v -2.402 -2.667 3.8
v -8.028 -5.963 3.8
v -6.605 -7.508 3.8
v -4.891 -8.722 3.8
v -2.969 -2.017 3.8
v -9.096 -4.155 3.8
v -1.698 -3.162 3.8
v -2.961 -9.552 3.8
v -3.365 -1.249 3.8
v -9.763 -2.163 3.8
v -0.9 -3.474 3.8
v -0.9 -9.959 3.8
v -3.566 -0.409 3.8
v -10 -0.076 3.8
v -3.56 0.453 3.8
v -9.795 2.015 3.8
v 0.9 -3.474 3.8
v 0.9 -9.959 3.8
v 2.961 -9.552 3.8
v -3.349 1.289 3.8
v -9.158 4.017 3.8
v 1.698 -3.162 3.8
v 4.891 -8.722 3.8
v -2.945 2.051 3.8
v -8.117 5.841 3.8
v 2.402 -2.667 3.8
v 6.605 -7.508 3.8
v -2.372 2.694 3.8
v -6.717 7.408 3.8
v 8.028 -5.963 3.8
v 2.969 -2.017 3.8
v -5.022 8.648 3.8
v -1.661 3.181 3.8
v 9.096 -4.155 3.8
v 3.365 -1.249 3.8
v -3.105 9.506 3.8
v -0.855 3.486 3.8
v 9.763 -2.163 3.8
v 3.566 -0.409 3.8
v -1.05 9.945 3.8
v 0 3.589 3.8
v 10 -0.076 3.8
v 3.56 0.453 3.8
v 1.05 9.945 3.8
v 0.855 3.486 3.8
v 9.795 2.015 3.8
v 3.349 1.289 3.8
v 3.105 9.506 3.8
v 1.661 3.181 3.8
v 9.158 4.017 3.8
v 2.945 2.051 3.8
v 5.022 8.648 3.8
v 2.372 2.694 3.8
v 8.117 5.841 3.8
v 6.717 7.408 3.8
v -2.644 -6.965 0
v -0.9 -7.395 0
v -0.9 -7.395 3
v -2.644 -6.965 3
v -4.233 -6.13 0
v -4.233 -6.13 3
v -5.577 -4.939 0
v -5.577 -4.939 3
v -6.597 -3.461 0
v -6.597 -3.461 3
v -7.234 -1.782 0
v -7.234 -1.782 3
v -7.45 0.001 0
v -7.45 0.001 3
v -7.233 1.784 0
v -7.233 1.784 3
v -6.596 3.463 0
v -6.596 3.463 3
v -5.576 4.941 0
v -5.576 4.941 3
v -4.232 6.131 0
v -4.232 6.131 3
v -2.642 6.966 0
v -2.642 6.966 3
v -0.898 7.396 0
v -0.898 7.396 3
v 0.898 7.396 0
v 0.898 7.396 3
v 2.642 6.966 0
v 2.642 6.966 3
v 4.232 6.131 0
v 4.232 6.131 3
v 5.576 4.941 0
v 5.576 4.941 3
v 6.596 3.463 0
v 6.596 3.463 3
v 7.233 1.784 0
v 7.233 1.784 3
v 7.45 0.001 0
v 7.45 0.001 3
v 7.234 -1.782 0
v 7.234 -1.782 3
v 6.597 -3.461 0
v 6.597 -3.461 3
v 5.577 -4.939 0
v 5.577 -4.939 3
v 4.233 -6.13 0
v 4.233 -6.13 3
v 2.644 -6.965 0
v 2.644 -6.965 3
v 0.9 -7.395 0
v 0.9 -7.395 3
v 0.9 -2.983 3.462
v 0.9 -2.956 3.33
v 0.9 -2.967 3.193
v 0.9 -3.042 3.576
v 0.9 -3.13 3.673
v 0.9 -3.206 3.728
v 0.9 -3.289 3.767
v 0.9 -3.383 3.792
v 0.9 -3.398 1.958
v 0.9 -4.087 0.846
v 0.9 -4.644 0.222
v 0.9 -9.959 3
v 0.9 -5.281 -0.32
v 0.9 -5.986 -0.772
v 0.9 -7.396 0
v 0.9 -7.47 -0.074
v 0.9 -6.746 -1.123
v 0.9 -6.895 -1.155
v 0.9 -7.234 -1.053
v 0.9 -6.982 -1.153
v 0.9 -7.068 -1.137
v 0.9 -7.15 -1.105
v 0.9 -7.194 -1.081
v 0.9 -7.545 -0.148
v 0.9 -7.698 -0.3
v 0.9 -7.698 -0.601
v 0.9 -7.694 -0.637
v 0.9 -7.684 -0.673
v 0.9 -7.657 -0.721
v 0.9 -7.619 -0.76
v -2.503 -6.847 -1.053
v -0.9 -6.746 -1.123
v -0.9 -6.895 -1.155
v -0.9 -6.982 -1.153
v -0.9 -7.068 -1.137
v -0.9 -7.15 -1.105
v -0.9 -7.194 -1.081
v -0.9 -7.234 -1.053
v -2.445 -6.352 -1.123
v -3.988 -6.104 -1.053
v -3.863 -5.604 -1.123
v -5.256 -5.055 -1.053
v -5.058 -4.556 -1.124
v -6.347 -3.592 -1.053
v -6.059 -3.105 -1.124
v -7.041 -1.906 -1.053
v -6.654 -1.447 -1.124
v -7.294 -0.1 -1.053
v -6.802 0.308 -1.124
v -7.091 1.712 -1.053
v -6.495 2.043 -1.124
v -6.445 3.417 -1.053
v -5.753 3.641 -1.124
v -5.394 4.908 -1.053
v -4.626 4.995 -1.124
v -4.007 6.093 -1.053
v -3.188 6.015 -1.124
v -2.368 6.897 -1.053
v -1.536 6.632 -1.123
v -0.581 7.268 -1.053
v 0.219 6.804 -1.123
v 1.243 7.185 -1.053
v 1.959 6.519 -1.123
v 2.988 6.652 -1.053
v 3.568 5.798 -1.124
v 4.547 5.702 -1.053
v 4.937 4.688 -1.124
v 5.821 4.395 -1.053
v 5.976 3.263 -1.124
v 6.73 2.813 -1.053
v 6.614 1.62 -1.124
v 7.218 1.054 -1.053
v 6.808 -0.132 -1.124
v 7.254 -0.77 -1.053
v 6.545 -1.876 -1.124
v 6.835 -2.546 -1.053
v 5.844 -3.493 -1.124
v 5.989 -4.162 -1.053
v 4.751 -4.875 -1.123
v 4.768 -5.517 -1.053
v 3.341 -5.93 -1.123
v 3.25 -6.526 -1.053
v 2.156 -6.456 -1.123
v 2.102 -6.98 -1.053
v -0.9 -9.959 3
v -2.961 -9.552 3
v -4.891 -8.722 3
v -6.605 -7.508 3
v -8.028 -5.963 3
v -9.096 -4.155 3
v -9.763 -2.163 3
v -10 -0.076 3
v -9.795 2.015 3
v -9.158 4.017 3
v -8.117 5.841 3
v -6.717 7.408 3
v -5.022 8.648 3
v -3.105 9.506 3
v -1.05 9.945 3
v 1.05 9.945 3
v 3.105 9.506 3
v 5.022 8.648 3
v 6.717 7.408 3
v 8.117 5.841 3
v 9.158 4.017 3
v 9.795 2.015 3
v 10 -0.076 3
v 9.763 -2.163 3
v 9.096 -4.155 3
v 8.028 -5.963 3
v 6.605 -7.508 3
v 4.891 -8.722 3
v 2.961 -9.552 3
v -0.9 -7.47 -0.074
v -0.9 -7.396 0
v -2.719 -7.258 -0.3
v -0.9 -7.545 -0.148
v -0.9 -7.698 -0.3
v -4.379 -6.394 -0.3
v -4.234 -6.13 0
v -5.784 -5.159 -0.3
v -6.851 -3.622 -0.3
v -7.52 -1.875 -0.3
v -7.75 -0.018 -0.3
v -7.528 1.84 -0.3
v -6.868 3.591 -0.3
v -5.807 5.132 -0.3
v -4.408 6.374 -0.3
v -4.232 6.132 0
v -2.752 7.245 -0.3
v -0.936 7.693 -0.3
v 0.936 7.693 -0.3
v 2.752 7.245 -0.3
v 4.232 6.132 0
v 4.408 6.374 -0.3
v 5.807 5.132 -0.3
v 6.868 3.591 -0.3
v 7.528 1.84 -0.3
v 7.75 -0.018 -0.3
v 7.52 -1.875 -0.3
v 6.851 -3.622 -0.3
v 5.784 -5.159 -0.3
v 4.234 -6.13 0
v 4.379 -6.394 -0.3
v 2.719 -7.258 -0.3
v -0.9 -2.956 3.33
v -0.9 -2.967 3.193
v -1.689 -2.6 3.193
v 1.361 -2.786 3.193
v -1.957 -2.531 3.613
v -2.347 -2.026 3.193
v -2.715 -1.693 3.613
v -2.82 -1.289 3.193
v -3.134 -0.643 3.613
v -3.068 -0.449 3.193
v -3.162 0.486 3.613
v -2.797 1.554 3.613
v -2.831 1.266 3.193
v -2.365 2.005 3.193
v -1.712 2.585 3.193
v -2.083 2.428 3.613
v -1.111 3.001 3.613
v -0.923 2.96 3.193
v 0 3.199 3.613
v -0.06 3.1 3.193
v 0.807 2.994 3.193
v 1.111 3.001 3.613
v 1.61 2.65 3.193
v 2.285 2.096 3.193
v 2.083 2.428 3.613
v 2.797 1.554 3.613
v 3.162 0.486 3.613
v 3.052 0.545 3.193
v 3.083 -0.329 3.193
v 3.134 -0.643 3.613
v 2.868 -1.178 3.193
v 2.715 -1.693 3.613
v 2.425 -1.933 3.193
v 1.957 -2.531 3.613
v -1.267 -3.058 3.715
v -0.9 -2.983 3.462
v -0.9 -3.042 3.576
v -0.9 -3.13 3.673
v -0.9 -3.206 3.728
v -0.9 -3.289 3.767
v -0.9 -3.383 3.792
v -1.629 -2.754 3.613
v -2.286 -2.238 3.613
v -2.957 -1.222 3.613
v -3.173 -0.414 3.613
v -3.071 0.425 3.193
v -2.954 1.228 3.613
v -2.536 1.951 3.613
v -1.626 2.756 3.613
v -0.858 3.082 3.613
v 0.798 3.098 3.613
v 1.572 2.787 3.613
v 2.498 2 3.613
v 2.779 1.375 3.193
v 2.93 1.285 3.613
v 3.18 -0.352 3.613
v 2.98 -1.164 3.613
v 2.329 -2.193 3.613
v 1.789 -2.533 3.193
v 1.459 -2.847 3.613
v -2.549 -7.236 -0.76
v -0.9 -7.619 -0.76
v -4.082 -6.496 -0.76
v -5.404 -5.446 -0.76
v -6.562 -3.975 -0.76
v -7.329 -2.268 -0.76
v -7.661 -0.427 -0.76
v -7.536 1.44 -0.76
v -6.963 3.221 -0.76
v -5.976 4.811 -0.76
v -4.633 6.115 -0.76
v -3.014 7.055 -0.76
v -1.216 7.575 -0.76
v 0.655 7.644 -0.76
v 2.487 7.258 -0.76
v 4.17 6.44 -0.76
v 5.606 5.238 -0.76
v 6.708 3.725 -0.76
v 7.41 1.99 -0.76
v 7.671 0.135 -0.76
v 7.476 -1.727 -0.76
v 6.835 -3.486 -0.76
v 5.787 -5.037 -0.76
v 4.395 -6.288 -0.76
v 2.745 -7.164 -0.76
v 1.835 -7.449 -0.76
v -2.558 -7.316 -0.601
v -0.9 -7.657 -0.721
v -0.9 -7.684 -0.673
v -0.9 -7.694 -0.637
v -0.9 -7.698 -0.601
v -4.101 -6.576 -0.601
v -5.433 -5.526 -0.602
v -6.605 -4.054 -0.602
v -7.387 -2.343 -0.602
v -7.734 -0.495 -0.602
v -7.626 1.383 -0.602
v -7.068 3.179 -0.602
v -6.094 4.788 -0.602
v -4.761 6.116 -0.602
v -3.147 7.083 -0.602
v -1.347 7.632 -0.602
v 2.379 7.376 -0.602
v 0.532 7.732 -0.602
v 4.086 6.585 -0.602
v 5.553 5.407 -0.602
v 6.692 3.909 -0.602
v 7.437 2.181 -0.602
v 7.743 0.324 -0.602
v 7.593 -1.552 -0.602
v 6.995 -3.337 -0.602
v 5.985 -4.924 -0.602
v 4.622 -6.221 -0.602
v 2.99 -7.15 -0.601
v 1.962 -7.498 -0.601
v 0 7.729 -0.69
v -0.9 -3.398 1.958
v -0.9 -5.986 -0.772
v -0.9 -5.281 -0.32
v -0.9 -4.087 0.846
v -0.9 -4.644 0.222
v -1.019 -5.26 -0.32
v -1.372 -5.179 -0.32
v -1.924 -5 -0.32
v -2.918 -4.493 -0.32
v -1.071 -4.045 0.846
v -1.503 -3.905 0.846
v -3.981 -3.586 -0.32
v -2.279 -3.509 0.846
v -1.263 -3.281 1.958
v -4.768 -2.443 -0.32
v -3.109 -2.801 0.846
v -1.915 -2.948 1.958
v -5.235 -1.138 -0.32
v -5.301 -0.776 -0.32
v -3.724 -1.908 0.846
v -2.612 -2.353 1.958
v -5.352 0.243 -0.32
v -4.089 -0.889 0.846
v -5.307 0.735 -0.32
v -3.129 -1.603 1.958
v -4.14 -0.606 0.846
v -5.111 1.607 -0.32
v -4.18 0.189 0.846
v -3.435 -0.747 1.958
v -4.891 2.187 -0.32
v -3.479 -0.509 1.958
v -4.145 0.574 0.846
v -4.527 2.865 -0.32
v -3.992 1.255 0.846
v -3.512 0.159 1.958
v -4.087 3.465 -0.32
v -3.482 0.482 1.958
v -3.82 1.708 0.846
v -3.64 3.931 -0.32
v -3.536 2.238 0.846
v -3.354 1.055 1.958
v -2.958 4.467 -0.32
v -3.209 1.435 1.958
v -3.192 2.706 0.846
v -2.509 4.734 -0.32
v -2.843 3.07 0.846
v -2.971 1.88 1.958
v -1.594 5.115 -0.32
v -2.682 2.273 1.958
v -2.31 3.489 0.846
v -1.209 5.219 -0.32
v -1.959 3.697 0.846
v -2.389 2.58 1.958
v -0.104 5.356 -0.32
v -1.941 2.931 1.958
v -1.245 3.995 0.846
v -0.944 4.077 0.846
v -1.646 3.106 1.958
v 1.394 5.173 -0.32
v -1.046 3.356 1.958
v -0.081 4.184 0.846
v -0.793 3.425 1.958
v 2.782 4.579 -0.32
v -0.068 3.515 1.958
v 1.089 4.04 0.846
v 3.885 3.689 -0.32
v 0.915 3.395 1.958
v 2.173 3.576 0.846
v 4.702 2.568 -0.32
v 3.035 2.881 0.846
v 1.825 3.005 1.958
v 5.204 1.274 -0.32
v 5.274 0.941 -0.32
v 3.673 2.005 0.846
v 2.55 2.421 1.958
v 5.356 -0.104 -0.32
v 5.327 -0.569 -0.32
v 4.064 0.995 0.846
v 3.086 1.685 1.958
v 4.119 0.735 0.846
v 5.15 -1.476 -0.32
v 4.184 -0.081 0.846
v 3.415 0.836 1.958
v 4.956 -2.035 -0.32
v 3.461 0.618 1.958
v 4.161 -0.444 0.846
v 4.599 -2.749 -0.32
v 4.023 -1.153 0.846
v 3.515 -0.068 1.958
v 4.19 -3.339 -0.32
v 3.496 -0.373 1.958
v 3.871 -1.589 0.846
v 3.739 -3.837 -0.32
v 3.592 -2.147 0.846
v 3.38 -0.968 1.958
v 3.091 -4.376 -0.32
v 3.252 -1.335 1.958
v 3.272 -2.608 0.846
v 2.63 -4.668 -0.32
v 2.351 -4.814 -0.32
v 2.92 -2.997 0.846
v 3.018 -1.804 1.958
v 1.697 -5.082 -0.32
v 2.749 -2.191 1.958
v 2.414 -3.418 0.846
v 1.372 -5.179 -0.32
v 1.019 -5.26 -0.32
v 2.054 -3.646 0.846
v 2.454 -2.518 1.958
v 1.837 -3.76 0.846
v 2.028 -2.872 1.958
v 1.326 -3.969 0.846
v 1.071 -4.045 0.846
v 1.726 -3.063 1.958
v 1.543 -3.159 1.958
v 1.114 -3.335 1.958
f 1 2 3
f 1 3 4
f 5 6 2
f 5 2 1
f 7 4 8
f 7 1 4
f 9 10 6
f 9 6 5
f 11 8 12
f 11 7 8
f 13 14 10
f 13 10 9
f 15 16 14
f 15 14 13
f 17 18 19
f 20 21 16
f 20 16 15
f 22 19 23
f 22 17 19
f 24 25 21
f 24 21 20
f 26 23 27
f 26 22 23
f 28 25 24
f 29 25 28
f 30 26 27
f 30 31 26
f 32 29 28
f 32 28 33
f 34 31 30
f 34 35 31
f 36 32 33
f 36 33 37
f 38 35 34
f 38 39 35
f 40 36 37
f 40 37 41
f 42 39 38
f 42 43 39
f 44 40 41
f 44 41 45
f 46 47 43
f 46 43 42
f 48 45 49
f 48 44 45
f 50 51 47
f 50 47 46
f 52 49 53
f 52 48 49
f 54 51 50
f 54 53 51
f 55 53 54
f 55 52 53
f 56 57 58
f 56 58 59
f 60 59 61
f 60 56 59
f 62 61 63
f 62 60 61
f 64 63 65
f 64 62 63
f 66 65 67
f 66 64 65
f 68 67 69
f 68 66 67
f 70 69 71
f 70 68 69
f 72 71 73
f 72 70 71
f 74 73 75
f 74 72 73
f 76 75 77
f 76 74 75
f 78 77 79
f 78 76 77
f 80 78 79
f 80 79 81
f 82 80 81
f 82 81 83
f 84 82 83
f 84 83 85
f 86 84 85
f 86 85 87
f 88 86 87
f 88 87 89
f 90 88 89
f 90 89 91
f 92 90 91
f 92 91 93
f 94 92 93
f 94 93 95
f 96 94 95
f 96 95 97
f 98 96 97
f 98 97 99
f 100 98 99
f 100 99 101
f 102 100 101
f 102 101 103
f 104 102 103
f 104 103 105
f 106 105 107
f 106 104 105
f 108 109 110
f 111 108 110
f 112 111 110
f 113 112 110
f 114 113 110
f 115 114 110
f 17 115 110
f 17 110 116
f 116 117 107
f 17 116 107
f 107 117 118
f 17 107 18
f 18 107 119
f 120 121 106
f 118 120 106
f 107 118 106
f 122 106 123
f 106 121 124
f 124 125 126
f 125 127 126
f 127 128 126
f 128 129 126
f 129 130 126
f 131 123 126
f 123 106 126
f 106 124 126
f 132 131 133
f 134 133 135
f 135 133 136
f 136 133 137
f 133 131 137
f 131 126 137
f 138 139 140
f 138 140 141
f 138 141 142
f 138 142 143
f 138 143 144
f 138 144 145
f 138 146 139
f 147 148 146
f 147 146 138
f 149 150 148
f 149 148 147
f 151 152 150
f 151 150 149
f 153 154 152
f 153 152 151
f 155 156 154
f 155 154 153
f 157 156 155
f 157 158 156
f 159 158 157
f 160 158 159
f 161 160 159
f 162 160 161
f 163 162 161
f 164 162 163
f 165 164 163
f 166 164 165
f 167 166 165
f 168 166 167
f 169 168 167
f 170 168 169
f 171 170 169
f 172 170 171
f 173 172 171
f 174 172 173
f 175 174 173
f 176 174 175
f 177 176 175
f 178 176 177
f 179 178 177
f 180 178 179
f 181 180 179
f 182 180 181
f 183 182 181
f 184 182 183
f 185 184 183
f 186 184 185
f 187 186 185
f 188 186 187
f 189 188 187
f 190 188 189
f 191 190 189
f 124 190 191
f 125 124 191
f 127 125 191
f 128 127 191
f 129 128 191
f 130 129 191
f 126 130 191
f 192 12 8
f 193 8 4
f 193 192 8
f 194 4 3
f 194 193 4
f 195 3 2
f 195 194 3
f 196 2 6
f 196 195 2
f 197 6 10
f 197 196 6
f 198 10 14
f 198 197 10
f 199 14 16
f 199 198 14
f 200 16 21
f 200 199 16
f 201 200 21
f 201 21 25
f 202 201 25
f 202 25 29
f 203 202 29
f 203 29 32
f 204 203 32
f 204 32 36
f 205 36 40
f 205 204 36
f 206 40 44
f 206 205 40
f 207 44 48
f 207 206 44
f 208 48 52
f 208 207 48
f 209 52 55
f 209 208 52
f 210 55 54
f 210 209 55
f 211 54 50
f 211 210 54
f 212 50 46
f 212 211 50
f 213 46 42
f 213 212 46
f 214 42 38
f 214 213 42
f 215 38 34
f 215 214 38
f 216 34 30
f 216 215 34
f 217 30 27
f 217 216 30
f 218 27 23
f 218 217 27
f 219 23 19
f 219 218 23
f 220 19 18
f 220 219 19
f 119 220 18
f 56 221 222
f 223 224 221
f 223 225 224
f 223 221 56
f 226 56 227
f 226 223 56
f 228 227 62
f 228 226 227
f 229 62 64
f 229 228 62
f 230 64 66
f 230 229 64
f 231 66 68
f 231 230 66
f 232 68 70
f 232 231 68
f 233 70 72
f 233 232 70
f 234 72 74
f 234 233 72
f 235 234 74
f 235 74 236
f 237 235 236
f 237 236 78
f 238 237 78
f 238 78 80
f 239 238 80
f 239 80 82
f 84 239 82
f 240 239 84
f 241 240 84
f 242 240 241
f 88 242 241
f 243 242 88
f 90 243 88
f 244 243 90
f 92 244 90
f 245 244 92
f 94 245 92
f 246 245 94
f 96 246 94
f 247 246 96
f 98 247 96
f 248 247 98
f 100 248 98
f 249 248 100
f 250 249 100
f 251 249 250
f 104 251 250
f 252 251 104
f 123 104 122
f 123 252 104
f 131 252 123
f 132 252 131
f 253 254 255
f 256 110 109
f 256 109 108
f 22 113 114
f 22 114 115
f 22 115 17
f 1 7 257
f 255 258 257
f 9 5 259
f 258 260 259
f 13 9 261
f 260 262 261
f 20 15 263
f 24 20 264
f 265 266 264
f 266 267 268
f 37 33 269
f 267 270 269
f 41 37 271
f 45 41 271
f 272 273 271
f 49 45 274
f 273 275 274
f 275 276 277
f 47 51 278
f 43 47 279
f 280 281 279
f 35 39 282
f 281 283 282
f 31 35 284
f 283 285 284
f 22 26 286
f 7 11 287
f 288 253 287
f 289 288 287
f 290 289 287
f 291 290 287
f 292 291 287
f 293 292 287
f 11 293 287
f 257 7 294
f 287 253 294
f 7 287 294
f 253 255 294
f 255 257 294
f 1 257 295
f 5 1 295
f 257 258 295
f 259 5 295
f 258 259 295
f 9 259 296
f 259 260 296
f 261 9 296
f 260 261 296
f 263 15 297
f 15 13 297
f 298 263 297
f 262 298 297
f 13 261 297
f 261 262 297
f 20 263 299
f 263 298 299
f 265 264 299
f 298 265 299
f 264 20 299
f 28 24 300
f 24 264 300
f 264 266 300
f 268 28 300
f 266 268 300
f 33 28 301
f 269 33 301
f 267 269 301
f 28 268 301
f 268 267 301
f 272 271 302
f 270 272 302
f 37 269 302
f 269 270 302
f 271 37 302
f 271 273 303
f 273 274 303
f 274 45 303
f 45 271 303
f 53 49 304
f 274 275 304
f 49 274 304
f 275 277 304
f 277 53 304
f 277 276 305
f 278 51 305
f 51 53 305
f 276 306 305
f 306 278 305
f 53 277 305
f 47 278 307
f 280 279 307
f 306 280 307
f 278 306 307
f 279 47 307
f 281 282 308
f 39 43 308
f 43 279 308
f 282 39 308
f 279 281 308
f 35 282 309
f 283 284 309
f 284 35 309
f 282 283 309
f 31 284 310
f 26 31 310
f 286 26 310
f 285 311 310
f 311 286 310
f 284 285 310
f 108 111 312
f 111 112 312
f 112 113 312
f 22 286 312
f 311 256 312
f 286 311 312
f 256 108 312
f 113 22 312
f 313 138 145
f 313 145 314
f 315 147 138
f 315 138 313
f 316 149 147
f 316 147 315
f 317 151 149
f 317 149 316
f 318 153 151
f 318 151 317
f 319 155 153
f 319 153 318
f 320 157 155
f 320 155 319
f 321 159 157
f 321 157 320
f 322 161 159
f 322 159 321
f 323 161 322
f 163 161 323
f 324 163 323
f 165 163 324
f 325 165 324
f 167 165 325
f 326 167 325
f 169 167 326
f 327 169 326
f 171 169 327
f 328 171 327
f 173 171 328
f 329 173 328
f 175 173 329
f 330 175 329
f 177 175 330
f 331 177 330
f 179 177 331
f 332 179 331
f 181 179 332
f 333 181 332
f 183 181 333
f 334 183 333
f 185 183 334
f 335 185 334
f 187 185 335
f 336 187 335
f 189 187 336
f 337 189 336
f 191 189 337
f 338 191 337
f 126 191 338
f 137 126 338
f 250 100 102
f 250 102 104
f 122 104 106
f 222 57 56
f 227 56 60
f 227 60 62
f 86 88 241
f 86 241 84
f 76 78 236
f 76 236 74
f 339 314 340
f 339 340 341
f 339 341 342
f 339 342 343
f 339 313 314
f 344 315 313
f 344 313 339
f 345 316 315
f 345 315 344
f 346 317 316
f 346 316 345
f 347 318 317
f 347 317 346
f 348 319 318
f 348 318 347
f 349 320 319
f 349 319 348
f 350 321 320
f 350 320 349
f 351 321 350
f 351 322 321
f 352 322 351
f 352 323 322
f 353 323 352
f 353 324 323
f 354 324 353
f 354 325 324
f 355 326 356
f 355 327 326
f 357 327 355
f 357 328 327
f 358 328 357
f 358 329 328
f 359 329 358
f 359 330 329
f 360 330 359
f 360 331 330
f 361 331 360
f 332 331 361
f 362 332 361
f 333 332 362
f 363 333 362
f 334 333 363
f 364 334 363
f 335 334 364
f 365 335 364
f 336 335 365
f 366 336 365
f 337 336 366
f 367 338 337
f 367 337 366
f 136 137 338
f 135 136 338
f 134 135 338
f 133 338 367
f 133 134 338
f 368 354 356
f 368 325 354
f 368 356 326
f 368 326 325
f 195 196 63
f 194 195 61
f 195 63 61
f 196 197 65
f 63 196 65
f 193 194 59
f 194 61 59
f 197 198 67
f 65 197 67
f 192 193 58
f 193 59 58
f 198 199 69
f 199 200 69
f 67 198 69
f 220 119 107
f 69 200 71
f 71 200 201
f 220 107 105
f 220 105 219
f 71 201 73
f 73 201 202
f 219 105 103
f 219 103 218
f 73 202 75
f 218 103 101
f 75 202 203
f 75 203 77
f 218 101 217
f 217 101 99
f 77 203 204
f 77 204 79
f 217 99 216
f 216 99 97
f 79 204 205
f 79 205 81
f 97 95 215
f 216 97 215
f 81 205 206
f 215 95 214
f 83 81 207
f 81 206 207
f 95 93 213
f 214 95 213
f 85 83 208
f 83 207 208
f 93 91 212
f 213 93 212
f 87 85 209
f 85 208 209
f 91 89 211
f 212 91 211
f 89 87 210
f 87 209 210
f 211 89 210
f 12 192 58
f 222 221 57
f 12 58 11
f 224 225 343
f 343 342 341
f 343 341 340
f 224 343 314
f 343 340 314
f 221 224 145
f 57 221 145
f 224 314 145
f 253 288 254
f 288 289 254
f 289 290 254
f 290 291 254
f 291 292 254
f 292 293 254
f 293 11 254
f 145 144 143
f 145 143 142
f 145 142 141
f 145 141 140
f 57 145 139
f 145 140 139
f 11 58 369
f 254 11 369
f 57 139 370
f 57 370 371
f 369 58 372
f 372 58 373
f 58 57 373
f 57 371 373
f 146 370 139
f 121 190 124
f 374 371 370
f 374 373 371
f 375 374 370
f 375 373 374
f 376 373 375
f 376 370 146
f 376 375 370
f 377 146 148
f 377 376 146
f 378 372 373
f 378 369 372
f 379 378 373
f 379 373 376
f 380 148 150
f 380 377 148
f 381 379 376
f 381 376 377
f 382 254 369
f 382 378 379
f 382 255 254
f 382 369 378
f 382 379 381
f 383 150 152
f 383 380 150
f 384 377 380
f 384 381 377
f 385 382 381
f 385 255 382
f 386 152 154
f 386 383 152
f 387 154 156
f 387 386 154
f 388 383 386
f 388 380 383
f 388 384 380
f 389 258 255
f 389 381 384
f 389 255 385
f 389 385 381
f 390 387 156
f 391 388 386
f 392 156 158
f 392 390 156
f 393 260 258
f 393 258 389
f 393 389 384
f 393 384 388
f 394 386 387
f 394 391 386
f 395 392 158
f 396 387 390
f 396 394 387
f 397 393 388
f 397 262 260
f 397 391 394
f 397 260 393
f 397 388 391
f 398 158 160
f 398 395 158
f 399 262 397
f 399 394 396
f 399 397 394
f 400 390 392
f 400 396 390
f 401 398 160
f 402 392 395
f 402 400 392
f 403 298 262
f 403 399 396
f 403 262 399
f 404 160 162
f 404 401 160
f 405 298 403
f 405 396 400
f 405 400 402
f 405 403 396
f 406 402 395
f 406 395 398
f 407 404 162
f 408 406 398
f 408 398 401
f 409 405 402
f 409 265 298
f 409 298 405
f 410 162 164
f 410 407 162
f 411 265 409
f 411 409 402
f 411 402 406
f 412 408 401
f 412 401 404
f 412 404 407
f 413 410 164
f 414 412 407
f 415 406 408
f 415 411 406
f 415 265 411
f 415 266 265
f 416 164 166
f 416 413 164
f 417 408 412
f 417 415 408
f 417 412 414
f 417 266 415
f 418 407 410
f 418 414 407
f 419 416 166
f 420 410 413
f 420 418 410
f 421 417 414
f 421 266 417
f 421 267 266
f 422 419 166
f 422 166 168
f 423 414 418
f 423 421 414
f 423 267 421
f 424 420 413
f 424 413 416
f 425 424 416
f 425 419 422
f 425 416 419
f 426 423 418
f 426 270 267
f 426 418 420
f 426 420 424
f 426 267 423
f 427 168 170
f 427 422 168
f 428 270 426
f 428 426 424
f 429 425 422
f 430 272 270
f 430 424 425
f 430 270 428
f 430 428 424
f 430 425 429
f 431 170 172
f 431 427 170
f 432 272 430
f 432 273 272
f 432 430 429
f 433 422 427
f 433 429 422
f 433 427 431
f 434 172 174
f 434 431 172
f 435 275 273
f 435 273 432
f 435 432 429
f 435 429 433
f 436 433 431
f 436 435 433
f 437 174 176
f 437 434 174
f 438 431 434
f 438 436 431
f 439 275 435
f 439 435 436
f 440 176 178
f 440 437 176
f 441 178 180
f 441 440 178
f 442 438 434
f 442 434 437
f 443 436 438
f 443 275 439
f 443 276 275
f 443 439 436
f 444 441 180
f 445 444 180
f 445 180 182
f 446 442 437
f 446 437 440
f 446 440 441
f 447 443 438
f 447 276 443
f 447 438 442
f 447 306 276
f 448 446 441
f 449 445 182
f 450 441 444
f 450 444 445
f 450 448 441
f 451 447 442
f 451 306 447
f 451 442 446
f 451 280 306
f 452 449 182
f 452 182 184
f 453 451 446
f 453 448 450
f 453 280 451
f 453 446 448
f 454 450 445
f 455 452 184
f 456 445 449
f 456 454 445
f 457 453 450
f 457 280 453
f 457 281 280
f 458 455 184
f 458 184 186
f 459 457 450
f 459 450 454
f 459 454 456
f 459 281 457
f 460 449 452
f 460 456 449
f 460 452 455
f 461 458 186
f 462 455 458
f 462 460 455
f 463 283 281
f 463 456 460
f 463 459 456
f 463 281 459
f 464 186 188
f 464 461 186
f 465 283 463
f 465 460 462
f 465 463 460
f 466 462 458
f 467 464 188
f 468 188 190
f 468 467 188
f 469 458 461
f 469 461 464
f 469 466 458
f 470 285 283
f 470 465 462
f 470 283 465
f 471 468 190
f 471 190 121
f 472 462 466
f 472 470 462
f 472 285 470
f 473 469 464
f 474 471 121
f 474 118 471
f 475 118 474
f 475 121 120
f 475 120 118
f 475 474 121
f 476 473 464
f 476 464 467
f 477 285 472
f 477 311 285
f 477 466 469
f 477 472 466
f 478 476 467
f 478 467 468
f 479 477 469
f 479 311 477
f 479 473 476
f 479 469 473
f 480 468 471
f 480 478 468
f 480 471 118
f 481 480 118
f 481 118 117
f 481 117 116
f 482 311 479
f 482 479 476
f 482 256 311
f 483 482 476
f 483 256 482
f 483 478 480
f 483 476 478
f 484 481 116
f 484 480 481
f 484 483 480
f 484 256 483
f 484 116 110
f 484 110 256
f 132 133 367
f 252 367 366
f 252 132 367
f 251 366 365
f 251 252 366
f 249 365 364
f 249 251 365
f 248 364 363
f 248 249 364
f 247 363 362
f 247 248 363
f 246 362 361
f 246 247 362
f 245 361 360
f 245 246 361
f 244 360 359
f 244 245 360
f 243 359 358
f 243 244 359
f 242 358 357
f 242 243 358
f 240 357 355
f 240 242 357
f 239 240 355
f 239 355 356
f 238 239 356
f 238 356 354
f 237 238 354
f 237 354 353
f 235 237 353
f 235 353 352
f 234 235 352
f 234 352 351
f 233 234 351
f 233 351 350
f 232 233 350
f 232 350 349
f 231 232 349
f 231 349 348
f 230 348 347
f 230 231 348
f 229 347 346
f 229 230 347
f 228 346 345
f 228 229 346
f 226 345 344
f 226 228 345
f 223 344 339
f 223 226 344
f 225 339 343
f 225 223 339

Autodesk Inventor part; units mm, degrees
ref_plane "YZ Plane" through (0, 0, 0) normal (1, 0, 0) x (0, 1, 0)
ref_plane "XZ Plane" through (0, 0, 0) normal (0, 1, 0) x (-1, 0, 0)
ref_plane "XY Plane" through (0, 0, 0) normal (0, 0, 1) x (1, 0, 0)
sketch "Skizze1" plane through (0, 0, 0) normal (0, 0, 1) x (1, 0, 0)
  circle A0 centre (0, 0) radius 7.45
  line L0 (-0.9, 9) -> (0.9, 9)
  line L1 (0.9, 9) -> (0.9, -9)
  line L2 (0.9, -9) -> (-0.9, -9)
  line L3 (-0.9, -9) -> (-0.9, 9)
  line L4 (-0.9, 9) -> (0.9, -9) construction
  line L5 (0.9, 9) -> (-0.9, -9) construction
  circle A1 centre (0, 0) radius 2.25
  point P0 (-0.9, -2.0622)
  point P1 (0.9, -2.0622)
  point P2 (0.9, -7.3954)
  point P3 (-0.9, -7.3954)
  dimension "d0" = 14.9
  dimension "d1" = 1.8
  dimension "d2" = 4.5
extrude "Extrusion1" add sketch "Skizze1" along normal blind 3 contours A0 L1 A1 | L1 A1 L3 A0 | L3 A1 A0 picked at (0.4002, 5.6965)
sketch "Skizze2" plane through (0, 0, 3) normal (0, 0, 1) x (1, 0, 0)
  line L0 (0.9, -2.0622) -> (0.9, -7.3954) projected
  arc A0 (0.9, -7.3954) -> (-0.9, -7.3954) centre (0, 0) ccw projected
  line L1 (-0.9, -7.3954) -> (-0.9, -2.0622) projected
  arc A1 (0.9, -2.0622) -> (-0.9, -2.0622) centre (0, 0) ccw projected
  circle A2 centre (0, 0) radius 10
  line L2 (-0.9, 11.3464) -> (0.9, 11.3464)
  line L3 (0.9, 11.3464) -> (0.9, -11.3464)
  line L4 (0.9, -11.3464) -> (-0.9, -11.3464)
  line L5 (-0.9, -11.3464) -> (-0.9, 11.3464)
  line L6 (-0.9, 11.3464) -> (0.9, -11.3464) construction
  line L7 (0.9, 11.3464) -> (-0.9, -11.3464) construction
  point P0 (-0.9, -9.9594)
  point P1 (-0.9, 2.0622)
  point P2 (-0.9, 7.3954)
  point P3 (0.9, 7.3954)
  point P4 (0.9, 2.0622)
  point P5 (0.9, -9.9594)
  dimension "d5" = 20
  dimension "d6" = 1.8
extrude "Extrusion2" add sketch "Skizze2" along normal blind 0.8 contours A1 L3 A0 L0 | A0 L3 A2 | A1 L5 A0 L3 | A0 L5 A2 L3 | A1 L1 A0 L5 | A0 L5 A2
sketch "Skizze3" plane through (0, 0, 0) normal (0, 0, -1) x (-1, 0, 0)
  line L0 (-0.9, -2.0622) -> (-0.9, -7.3954) projected
  arc A0 (0.9, -2.0622) -> (-0.9, -2.0622) centre (0, 0) ccw projected
  line L1 (0.9, -7.3954) -> (0.9, -2.0622) projected
  arc A1 (0.9, -7.3954) -> (-0.9, -7.3954) centre (0, 0) ccw projected
  circle A2 centre (0, 0) radius 7.75
  line L2 (0.9, 14.7103) -> (-0.9, 14.7103)
  line L3 (-0.9, 14.7103) -> (-0.9, -14.7103)
  line L4 (-0.9, -14.7103) -> (0.9, -14.7103)
  line L5 (0.9, -14.7103) -> (0.9, 14.7103)
  line L6 (0.9, 14.7103) -> (-0.9, -14.7103) construction
  line L7 (-0.9, 14.7103) -> (0.9, -14.7103) construction
  point P0 (-0.9, -7.6976)
  point P1 (0.9, -7.6976)
  dimension "d9" = 15.5
  dimension "d10" = 1.8
extrude "Extrusion3" add sketch "Skizze3" along normal blind 1.4 contours L0 A1 L3 A0 | L3 A2 A1 | L3 A1 L5 A0 | L3 A2 L5 A1 | L5 A1 L1 A0 | L5 A2 A1
sketch "Skizze4" plane through (0, 0, 3.8) normal (0, 0, 1) x (1, 0, 0)
  circle A0 centre (0, 0) radius 3
extrude "Extrusion4" cut sketch "Skizze4" against normal through all
chamfer "Fase2" distance 0.3 angle 45 1 edges at (0, 7.75, 0)
fillet "Rundung5" radius 6 1 edges at (0, 3, -1.4)
chamfer "Fase3" distance 0.7 angle 45 1 edges at (0, 7.75, -1.4)
fillet "Rundung6" radius 0.5 1 edges at (0, 7.0754, -1.2194)
fillet "Rundung7" radius 0.2 1 edges at (0, 7.75, -0.7)
fillet "Rundung8" radius 0.5 1 edges at (0, 3, 3.8)
properties part number "Buttomplate_BedholePlug"
